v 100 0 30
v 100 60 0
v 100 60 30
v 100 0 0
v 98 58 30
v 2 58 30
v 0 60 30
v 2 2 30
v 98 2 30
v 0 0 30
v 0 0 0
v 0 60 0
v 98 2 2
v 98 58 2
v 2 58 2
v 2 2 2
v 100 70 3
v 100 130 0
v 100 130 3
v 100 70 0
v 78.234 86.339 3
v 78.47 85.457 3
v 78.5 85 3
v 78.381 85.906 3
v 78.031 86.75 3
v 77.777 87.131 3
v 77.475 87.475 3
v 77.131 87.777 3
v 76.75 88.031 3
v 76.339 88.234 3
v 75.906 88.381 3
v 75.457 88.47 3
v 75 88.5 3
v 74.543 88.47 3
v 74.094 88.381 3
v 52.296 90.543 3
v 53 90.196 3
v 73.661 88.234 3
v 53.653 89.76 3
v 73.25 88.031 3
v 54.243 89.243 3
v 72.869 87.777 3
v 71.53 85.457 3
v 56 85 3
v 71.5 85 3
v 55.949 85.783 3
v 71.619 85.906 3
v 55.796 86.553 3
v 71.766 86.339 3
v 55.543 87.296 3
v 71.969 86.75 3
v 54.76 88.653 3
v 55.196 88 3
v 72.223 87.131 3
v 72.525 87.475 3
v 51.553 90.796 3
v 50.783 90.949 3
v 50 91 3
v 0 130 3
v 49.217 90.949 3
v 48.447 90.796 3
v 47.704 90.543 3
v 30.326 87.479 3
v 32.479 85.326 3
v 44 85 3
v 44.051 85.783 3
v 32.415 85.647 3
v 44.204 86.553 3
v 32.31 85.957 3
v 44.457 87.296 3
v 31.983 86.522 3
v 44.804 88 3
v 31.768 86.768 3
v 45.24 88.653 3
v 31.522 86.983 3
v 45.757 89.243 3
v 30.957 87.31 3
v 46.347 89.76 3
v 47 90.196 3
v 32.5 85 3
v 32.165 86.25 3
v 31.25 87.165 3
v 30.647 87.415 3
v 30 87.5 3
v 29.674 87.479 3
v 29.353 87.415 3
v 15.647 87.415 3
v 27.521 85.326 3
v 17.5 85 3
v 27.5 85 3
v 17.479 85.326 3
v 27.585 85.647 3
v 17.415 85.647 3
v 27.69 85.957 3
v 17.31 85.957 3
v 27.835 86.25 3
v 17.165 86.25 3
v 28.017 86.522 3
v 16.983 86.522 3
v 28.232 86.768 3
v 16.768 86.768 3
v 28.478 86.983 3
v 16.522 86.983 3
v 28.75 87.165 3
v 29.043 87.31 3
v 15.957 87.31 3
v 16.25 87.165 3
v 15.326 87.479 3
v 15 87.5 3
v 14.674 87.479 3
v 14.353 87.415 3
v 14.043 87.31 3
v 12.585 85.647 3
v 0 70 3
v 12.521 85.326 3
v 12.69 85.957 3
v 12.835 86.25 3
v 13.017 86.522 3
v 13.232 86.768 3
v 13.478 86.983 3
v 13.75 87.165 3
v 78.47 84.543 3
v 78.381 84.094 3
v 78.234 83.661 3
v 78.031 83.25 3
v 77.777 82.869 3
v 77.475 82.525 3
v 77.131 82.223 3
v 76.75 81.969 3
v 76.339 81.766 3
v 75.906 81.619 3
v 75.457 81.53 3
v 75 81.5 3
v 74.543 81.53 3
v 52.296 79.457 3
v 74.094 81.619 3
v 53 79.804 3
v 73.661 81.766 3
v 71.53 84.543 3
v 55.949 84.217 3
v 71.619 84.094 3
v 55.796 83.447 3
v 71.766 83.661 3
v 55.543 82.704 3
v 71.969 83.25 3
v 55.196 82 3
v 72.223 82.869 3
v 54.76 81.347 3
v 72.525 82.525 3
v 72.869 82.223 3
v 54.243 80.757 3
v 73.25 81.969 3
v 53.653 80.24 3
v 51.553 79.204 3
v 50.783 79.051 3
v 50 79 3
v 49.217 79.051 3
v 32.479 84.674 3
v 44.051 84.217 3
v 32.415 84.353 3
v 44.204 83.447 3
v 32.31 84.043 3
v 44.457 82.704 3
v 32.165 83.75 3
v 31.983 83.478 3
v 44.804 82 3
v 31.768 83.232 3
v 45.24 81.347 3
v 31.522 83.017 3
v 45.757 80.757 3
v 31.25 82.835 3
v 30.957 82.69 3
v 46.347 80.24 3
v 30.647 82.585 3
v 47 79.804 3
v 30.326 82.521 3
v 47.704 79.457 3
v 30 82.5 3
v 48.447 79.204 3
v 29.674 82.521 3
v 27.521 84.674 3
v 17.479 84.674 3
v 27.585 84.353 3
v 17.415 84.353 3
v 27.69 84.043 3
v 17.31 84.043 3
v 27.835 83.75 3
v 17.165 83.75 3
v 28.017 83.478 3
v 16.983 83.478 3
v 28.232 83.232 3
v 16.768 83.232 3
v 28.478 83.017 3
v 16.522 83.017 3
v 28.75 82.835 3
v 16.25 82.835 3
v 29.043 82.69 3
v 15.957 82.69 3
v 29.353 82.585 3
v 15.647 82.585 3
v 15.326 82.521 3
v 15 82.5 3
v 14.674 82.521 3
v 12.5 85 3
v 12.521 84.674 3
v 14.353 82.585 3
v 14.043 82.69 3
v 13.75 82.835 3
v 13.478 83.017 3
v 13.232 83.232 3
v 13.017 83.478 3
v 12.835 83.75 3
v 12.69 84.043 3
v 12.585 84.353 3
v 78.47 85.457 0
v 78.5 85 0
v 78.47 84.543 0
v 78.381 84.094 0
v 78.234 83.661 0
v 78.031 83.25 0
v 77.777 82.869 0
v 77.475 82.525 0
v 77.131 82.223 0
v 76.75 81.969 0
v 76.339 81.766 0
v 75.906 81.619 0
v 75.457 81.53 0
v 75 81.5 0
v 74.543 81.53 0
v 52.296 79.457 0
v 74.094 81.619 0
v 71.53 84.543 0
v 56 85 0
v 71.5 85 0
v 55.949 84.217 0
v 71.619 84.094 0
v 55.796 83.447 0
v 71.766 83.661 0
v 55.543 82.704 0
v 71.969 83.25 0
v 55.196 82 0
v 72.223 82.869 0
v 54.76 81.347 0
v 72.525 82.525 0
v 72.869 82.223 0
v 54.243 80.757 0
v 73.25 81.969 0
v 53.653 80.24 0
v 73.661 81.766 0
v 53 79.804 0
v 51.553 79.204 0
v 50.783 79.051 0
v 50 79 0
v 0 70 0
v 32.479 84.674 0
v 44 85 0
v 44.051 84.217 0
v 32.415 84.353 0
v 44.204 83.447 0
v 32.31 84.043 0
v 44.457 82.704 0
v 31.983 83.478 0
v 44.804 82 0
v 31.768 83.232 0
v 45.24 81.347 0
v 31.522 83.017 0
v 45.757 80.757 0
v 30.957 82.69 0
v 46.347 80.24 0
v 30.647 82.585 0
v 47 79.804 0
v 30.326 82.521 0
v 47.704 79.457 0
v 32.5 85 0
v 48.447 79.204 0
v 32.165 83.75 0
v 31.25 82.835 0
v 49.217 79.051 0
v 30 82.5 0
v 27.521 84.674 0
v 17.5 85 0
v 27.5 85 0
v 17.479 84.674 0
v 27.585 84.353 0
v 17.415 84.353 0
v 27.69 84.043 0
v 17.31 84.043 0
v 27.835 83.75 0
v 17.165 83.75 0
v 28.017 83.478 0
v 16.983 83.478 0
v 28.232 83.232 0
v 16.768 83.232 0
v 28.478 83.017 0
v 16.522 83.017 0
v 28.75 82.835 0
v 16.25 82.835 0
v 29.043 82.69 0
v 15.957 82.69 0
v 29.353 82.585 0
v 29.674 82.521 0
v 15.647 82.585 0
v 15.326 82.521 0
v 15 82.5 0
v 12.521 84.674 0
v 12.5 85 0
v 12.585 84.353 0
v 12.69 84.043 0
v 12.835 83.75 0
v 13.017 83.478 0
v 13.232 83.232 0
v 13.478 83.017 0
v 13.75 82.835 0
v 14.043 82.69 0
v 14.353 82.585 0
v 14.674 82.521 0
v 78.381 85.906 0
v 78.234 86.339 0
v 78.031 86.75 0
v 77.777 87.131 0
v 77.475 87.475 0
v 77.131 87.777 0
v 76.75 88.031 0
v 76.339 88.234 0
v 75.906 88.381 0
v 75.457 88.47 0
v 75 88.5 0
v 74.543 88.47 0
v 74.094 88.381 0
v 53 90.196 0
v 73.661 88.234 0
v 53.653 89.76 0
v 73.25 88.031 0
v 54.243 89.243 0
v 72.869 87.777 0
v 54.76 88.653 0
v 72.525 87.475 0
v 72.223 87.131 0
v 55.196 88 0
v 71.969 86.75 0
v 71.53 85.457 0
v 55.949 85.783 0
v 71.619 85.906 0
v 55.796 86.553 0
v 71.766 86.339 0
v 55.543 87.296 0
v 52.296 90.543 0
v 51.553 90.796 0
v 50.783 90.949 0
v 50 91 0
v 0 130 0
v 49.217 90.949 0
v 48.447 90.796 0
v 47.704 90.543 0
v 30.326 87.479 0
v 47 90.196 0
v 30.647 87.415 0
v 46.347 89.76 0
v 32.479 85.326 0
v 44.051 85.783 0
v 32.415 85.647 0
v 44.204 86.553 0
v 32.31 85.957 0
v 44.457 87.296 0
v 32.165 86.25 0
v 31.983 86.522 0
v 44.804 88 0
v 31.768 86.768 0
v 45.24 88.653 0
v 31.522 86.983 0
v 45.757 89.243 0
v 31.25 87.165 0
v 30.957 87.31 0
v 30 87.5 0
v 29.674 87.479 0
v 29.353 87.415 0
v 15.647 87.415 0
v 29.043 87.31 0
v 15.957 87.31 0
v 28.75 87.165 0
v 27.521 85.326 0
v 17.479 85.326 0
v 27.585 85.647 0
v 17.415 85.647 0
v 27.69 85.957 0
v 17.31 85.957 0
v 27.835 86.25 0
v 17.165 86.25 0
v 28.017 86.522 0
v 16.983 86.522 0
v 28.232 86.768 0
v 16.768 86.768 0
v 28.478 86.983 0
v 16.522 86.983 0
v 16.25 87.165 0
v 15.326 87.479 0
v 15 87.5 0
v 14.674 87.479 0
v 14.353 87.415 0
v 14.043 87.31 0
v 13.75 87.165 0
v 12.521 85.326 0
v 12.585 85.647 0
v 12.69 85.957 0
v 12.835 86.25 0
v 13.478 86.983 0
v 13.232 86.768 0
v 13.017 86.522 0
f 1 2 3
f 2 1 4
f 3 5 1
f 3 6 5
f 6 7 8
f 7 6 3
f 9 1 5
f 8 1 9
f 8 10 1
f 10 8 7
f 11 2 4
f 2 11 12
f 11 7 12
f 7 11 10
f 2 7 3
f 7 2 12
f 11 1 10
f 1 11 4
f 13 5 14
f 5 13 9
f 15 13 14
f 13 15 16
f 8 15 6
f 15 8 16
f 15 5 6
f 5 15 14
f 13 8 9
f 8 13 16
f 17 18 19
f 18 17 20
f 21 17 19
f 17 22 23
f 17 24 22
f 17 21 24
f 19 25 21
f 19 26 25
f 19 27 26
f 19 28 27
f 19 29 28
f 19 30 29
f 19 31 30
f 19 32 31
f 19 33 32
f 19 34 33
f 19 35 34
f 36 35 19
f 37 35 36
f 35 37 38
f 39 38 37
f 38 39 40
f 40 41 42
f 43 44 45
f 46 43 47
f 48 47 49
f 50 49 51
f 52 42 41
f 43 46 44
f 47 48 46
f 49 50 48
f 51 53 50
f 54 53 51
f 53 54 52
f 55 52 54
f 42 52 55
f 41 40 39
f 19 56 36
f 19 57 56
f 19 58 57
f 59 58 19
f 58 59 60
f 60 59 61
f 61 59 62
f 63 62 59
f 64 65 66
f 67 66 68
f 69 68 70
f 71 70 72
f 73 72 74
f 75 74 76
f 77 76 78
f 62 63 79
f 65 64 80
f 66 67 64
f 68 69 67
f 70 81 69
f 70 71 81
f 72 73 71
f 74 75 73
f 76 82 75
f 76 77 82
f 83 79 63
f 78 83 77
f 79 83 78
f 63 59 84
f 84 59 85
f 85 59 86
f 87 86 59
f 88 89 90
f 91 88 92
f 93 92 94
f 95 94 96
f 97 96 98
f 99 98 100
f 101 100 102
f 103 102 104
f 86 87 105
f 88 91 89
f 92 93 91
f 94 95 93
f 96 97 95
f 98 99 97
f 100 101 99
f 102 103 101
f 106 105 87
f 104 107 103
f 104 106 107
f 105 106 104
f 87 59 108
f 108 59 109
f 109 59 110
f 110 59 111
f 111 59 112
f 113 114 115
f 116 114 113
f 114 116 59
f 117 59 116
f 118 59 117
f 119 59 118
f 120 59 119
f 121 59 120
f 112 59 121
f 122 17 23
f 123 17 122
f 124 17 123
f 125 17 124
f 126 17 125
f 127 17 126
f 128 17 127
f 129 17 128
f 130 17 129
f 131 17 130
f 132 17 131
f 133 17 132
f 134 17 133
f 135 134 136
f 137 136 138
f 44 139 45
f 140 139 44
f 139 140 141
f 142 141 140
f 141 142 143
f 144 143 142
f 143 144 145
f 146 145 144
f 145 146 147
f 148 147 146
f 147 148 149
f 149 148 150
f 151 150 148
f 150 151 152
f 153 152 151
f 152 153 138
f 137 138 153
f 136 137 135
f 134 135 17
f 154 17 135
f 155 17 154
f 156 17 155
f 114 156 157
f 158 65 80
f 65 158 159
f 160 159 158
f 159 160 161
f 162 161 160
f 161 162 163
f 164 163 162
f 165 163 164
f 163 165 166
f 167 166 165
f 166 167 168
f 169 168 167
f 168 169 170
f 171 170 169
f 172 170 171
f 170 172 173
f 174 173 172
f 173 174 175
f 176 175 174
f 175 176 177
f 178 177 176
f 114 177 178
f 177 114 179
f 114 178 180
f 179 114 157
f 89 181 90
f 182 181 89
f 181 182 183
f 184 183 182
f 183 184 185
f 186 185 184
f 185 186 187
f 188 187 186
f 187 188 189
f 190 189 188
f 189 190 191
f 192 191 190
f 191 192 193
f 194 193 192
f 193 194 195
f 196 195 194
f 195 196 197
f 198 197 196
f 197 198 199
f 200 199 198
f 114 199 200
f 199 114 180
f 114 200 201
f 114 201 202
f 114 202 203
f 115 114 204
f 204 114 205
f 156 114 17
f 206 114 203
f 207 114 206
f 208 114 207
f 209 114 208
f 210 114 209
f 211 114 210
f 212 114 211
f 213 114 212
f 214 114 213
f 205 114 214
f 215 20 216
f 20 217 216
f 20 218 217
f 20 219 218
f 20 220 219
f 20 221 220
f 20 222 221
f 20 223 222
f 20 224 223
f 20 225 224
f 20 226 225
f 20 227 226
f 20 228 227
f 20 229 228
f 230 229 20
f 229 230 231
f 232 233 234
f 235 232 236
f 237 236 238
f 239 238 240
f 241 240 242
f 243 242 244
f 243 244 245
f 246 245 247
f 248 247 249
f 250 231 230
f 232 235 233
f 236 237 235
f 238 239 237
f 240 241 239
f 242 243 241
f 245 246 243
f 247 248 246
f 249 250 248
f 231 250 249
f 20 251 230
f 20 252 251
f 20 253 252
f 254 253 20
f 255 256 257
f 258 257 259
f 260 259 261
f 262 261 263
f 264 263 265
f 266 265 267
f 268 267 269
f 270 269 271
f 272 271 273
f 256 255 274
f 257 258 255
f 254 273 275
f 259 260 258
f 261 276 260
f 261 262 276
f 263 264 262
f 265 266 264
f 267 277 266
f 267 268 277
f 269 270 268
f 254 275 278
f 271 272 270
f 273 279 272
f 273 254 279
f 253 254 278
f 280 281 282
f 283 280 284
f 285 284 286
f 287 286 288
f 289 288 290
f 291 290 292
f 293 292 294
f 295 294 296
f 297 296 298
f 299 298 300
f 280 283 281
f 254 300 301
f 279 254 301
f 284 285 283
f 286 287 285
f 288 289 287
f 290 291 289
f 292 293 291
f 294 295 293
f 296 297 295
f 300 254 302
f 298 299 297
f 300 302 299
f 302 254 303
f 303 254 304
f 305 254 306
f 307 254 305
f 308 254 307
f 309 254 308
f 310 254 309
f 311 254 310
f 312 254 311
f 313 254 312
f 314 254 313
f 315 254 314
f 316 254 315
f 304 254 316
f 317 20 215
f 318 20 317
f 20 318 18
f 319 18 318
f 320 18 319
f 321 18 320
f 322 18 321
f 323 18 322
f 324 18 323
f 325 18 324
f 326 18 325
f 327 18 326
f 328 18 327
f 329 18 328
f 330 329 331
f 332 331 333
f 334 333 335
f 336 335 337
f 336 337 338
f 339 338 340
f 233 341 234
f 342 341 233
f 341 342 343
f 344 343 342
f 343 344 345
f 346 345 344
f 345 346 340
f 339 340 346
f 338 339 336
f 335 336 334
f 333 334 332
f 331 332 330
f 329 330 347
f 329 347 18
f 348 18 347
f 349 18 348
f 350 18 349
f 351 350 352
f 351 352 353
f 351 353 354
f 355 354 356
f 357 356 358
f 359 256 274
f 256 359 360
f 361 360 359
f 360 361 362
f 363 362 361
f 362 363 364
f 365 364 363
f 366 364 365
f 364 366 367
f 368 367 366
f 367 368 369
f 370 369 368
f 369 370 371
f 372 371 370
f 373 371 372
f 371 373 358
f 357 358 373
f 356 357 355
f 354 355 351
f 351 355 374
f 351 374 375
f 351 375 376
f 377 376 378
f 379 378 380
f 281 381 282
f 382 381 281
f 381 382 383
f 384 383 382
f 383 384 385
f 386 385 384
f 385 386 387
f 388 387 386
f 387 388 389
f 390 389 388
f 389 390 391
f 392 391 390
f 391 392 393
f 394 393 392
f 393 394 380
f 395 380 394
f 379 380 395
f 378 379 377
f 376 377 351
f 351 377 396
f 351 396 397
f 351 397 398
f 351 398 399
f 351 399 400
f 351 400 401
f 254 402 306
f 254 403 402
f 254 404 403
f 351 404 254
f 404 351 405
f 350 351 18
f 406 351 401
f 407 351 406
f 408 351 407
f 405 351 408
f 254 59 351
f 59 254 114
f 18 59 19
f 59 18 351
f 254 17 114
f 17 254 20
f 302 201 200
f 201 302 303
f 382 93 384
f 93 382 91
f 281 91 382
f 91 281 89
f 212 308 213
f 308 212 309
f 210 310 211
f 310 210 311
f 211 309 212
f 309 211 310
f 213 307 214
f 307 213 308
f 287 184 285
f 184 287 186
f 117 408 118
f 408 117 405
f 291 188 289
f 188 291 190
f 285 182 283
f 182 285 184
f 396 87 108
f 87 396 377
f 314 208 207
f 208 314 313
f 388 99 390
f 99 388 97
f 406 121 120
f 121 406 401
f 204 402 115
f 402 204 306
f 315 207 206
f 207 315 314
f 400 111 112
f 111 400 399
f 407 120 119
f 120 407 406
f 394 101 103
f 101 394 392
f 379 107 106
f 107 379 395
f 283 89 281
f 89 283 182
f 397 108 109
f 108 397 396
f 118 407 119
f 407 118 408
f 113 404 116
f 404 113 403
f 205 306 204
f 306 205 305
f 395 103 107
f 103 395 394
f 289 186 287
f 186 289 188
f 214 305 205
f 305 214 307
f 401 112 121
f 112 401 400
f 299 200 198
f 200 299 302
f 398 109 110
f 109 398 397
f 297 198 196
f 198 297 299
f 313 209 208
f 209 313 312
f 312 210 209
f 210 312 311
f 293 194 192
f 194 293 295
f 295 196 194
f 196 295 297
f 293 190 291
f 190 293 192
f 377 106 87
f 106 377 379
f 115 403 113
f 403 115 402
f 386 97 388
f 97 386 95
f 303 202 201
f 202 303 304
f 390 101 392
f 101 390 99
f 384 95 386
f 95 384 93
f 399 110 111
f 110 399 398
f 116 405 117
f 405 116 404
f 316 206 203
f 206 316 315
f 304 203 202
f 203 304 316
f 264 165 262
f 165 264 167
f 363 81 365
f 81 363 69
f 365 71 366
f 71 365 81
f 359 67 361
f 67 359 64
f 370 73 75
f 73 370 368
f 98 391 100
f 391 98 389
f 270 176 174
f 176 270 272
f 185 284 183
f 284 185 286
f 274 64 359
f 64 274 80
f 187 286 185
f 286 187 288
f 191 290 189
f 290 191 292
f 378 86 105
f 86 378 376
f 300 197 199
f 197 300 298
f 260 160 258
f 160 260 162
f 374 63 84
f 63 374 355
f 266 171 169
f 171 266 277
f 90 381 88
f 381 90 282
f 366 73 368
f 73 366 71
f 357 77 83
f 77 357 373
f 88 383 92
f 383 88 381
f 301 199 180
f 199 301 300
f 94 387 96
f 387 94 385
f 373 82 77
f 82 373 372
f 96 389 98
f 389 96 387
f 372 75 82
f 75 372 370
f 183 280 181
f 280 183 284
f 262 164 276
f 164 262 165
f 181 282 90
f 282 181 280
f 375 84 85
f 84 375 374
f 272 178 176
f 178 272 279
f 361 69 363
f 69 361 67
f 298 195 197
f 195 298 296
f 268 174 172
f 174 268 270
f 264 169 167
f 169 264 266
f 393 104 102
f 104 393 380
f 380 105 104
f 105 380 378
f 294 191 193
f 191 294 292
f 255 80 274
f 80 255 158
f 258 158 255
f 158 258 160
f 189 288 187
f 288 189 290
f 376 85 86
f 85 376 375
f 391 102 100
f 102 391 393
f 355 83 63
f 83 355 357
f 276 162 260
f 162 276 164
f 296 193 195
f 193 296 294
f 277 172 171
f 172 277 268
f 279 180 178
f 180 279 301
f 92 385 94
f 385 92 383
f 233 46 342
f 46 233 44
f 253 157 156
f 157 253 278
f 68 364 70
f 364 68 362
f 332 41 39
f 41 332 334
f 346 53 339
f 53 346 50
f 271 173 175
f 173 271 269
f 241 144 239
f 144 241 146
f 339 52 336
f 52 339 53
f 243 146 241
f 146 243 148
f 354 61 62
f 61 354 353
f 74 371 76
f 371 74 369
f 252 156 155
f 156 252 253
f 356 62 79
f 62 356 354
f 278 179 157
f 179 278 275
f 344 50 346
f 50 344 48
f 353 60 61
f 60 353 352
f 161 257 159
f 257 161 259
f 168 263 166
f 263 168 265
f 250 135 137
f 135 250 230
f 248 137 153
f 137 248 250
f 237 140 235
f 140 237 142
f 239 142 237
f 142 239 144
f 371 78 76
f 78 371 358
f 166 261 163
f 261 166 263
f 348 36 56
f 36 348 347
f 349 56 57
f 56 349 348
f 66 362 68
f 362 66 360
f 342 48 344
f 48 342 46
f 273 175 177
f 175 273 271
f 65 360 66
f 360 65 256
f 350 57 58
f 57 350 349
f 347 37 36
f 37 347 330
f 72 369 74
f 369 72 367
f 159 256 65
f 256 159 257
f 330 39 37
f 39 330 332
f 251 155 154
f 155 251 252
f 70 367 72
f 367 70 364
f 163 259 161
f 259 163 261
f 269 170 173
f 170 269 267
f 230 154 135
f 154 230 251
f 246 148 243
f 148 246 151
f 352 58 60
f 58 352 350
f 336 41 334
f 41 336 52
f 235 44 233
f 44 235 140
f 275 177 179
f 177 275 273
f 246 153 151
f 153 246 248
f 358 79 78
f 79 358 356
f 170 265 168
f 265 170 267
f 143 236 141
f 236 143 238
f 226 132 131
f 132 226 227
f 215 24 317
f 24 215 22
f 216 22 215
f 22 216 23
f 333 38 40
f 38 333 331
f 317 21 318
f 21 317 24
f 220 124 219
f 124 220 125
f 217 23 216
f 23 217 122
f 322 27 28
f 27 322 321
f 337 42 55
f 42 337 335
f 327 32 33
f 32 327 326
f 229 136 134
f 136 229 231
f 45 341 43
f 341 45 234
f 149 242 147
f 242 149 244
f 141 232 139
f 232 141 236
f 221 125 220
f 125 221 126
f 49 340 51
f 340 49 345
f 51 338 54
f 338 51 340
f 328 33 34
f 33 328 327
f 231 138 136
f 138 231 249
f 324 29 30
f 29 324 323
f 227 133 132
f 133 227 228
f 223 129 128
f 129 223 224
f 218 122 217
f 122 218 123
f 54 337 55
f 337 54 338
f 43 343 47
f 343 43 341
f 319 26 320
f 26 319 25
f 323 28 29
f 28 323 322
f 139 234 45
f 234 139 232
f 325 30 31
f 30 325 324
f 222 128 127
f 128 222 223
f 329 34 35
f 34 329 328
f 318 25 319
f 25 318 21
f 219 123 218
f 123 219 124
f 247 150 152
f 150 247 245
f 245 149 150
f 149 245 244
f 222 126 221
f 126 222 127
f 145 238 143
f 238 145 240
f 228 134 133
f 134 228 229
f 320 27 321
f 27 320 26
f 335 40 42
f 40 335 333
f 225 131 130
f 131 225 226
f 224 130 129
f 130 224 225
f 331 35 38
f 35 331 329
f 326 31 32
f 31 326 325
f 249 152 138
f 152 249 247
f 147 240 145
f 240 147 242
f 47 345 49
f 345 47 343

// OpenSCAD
// Boiler Alert enclosure - printable concept
$fn = 48;
box_w = 100; box_h = 60; box_d = 30; wall = 2;

module base_box() {
  difference() {
    cube([box_w, box_h, box_d]);
    translate([wall, wall, wall]) cube([box_w-2*wall, box_h-2*wall, box_d]);
  }
}

module lid() {
  difference() {
    cube([box_w, box_h, 3]);
    translate([15, 15, -1]) cylinder(h=6, d=5);   // red LED
    translate([30, 15, -1]) cylinder(h=6, d=5);   // green LED
    translate([50, 15, -1]) cylinder(h=6, d=12);  // buzzer
    translate([75, 15, -1]) cylinder(h=6, d=7);   // mute
  }
}

base_box();
translate([0, 70, 0]) lid();
